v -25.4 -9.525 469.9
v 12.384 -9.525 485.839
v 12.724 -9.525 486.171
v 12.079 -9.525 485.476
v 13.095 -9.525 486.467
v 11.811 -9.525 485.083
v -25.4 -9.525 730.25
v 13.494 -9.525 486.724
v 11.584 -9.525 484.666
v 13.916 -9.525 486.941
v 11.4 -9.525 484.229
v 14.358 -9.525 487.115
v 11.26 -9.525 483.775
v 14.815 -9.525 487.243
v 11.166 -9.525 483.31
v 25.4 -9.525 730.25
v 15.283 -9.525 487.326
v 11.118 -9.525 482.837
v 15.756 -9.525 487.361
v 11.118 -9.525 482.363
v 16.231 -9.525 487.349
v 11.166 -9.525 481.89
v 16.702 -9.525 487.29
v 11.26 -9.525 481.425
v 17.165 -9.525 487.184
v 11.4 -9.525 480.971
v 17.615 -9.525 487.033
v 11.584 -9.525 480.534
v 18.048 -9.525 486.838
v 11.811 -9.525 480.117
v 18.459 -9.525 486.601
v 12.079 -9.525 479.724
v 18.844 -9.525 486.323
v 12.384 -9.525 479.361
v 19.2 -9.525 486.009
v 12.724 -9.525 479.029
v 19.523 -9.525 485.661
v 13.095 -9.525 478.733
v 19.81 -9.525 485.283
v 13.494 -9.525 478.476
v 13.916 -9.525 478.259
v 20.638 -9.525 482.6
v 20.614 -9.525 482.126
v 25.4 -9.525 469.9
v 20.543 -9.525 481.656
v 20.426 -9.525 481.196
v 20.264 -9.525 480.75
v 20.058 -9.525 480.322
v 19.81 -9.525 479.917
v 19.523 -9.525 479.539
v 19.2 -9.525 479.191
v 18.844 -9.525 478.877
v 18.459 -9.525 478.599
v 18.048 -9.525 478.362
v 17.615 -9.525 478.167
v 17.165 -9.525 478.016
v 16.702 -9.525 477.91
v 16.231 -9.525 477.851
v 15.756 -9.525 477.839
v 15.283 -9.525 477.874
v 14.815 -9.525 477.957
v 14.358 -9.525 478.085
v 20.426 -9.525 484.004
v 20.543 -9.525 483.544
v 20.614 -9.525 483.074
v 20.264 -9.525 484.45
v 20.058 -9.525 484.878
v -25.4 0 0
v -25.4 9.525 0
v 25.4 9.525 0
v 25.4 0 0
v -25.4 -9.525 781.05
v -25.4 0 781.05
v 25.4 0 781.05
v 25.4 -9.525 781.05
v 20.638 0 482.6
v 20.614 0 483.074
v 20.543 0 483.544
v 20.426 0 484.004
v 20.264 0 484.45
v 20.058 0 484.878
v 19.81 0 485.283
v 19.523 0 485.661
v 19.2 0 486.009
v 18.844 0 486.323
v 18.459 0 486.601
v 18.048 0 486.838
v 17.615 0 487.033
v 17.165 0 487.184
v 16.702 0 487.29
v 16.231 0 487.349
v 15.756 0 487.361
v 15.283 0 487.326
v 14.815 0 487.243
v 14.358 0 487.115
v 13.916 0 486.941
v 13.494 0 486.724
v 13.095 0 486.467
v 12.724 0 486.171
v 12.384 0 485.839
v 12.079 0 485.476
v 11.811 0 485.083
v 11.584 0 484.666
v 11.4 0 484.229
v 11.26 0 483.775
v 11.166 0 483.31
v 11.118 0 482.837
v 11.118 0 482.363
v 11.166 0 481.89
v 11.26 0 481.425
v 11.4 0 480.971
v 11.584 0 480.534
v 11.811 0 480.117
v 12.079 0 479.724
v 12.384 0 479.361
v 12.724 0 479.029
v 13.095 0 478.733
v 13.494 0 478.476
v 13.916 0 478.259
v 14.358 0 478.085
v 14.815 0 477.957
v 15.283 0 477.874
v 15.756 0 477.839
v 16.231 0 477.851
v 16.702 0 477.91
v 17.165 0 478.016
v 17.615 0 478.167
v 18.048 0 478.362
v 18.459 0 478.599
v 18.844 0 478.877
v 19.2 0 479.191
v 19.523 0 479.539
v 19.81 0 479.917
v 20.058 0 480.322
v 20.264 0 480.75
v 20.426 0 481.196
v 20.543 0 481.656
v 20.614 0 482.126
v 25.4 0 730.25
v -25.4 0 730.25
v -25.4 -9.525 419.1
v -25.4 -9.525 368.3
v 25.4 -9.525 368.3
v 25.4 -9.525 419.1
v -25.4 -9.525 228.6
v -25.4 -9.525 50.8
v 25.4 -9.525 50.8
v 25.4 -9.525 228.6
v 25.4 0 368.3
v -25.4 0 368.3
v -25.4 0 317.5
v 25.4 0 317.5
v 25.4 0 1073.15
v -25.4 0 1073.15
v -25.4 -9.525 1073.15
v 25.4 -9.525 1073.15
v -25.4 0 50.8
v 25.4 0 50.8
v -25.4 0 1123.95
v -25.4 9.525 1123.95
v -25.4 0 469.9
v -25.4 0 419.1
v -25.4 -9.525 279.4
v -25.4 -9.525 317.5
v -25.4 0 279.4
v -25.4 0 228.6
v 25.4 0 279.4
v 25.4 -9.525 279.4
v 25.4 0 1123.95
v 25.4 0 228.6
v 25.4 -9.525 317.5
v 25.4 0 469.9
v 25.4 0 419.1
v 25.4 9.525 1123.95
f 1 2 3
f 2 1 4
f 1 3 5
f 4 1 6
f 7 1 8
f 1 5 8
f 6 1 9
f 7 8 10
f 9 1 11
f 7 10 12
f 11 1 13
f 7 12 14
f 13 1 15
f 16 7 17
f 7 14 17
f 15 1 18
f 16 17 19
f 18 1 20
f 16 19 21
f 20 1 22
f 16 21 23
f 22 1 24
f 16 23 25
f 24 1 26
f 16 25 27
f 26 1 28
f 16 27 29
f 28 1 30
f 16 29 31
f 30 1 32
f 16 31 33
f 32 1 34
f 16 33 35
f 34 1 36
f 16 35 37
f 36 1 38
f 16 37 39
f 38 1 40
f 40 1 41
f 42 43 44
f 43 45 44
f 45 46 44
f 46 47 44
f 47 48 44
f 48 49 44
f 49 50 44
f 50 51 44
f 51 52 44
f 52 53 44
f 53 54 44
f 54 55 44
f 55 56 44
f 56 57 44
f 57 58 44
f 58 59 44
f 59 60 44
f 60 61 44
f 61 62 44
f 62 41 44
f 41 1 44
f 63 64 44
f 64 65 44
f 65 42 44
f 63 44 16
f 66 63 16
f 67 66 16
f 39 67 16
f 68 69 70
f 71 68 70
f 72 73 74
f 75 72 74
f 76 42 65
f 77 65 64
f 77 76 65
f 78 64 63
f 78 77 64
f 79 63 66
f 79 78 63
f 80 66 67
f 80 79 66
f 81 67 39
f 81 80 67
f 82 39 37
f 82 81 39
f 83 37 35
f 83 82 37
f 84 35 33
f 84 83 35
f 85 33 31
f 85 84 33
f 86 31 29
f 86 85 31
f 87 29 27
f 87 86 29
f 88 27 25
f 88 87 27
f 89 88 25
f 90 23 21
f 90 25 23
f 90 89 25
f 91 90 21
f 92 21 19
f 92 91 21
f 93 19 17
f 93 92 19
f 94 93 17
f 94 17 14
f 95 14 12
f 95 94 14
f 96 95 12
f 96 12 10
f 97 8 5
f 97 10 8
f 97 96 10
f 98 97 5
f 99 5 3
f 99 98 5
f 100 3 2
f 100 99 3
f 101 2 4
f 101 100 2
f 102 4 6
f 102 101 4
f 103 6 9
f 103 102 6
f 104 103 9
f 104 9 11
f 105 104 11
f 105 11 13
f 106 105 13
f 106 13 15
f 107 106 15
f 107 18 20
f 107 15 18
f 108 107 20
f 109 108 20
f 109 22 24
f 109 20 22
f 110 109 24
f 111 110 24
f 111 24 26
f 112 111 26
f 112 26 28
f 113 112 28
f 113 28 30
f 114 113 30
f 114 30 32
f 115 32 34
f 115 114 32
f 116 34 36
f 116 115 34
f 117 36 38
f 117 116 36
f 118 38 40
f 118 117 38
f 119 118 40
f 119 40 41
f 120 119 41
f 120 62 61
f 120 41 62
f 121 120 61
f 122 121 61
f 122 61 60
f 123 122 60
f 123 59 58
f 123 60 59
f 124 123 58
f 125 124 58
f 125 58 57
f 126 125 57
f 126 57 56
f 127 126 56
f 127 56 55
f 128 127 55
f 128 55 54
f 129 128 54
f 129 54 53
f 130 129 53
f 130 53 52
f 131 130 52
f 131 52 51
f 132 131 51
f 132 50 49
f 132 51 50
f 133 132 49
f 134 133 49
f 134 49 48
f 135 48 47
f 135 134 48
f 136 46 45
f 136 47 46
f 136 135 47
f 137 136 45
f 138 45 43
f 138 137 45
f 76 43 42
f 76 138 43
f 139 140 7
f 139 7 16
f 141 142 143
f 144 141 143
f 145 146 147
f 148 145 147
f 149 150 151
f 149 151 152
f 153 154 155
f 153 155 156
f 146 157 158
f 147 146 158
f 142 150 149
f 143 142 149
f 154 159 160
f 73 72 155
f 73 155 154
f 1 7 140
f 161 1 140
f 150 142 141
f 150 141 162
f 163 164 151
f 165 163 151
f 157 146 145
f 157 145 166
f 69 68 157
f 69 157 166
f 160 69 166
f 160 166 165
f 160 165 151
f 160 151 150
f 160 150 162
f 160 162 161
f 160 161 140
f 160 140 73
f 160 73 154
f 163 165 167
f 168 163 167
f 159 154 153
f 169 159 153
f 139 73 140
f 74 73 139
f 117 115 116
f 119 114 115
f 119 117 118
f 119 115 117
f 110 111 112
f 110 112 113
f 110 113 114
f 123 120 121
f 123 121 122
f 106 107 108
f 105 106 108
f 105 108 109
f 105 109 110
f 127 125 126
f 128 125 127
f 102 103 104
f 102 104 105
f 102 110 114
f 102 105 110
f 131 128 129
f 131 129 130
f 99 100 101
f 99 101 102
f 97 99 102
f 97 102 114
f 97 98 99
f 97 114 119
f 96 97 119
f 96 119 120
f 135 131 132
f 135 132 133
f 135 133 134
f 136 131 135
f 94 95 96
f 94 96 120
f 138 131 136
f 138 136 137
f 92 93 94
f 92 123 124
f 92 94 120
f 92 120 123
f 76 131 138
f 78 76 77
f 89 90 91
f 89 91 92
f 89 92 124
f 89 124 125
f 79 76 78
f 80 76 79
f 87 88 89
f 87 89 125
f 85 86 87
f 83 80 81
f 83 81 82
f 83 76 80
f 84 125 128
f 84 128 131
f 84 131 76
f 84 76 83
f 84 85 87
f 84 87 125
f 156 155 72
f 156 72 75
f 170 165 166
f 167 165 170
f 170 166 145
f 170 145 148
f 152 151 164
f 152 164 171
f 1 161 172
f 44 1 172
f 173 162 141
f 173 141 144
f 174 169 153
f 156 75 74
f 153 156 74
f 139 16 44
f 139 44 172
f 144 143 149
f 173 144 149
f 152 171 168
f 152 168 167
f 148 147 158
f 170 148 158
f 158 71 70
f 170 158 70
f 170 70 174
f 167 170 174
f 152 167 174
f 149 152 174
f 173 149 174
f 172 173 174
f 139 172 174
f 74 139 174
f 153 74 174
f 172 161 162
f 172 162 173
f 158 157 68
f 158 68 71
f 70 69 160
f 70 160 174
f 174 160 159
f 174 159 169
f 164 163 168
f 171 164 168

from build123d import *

# Parameters (mm, degrees)
F0_W     = 50.8
F0_H     = 19.05
F1_DEPTH = 1123.95
F2_W     = 122.435573
F2_H     = 50.8
F2_W_2   = 108.831619
F2_W_3   = 93.867282
F2_W_4   = 145.562325
F2_W_5   = 343.160421
F2_W_6   = 239.549167
F3_DEPTH = 25.4
F4_R     = 4.7625
F5_DEPTH = 25.4


with BuildPart() as f1:
    # F0 (on Top) → F1 (new body)
    with BuildSketch(Plane.XY):
        Rectangle(F0_W, F0_H)
    extrude(amount=F1_DEPTH)

    # F2 (on Front) → F3 (cut)
    with BuildSketch(Plane.XZ):
        with Locations((22.446524, 25.4)):
            Rectangle(F2_W, F2_H)
        with Locations((-4.761385, 342.9)):
            Rectangle(F2_W_2, F2_H)
        with Locations((2.720783, 755.65)):
            Rectangle(F2_W_3, F2_H)
        with Locations((-1.360391, 444.5)):
            Rectangle(F2_W_4, F2_H)
        with Locations((-38.781822, 1098.55)):
            Rectangle(F2_W_5, F2_H)
        with Locations((-25.794175, 254)):
            Rectangle(F2_W_6, F2_H)
    extrude(amount=F3_DEPTH, mode=Mode.SUBTRACT)

    # F4 (on Front) → F5 (cut)
    with BuildSketch(Plane.XZ):
        with Locations((15.875, 254)):
            Circle(F4_R)
        with Locations((15.875, 482.6)):
            Circle(F4_R)
    extrude(amount=F5_DEPTH, mode=Mode.SUBTRACT)


solid = f1.part
